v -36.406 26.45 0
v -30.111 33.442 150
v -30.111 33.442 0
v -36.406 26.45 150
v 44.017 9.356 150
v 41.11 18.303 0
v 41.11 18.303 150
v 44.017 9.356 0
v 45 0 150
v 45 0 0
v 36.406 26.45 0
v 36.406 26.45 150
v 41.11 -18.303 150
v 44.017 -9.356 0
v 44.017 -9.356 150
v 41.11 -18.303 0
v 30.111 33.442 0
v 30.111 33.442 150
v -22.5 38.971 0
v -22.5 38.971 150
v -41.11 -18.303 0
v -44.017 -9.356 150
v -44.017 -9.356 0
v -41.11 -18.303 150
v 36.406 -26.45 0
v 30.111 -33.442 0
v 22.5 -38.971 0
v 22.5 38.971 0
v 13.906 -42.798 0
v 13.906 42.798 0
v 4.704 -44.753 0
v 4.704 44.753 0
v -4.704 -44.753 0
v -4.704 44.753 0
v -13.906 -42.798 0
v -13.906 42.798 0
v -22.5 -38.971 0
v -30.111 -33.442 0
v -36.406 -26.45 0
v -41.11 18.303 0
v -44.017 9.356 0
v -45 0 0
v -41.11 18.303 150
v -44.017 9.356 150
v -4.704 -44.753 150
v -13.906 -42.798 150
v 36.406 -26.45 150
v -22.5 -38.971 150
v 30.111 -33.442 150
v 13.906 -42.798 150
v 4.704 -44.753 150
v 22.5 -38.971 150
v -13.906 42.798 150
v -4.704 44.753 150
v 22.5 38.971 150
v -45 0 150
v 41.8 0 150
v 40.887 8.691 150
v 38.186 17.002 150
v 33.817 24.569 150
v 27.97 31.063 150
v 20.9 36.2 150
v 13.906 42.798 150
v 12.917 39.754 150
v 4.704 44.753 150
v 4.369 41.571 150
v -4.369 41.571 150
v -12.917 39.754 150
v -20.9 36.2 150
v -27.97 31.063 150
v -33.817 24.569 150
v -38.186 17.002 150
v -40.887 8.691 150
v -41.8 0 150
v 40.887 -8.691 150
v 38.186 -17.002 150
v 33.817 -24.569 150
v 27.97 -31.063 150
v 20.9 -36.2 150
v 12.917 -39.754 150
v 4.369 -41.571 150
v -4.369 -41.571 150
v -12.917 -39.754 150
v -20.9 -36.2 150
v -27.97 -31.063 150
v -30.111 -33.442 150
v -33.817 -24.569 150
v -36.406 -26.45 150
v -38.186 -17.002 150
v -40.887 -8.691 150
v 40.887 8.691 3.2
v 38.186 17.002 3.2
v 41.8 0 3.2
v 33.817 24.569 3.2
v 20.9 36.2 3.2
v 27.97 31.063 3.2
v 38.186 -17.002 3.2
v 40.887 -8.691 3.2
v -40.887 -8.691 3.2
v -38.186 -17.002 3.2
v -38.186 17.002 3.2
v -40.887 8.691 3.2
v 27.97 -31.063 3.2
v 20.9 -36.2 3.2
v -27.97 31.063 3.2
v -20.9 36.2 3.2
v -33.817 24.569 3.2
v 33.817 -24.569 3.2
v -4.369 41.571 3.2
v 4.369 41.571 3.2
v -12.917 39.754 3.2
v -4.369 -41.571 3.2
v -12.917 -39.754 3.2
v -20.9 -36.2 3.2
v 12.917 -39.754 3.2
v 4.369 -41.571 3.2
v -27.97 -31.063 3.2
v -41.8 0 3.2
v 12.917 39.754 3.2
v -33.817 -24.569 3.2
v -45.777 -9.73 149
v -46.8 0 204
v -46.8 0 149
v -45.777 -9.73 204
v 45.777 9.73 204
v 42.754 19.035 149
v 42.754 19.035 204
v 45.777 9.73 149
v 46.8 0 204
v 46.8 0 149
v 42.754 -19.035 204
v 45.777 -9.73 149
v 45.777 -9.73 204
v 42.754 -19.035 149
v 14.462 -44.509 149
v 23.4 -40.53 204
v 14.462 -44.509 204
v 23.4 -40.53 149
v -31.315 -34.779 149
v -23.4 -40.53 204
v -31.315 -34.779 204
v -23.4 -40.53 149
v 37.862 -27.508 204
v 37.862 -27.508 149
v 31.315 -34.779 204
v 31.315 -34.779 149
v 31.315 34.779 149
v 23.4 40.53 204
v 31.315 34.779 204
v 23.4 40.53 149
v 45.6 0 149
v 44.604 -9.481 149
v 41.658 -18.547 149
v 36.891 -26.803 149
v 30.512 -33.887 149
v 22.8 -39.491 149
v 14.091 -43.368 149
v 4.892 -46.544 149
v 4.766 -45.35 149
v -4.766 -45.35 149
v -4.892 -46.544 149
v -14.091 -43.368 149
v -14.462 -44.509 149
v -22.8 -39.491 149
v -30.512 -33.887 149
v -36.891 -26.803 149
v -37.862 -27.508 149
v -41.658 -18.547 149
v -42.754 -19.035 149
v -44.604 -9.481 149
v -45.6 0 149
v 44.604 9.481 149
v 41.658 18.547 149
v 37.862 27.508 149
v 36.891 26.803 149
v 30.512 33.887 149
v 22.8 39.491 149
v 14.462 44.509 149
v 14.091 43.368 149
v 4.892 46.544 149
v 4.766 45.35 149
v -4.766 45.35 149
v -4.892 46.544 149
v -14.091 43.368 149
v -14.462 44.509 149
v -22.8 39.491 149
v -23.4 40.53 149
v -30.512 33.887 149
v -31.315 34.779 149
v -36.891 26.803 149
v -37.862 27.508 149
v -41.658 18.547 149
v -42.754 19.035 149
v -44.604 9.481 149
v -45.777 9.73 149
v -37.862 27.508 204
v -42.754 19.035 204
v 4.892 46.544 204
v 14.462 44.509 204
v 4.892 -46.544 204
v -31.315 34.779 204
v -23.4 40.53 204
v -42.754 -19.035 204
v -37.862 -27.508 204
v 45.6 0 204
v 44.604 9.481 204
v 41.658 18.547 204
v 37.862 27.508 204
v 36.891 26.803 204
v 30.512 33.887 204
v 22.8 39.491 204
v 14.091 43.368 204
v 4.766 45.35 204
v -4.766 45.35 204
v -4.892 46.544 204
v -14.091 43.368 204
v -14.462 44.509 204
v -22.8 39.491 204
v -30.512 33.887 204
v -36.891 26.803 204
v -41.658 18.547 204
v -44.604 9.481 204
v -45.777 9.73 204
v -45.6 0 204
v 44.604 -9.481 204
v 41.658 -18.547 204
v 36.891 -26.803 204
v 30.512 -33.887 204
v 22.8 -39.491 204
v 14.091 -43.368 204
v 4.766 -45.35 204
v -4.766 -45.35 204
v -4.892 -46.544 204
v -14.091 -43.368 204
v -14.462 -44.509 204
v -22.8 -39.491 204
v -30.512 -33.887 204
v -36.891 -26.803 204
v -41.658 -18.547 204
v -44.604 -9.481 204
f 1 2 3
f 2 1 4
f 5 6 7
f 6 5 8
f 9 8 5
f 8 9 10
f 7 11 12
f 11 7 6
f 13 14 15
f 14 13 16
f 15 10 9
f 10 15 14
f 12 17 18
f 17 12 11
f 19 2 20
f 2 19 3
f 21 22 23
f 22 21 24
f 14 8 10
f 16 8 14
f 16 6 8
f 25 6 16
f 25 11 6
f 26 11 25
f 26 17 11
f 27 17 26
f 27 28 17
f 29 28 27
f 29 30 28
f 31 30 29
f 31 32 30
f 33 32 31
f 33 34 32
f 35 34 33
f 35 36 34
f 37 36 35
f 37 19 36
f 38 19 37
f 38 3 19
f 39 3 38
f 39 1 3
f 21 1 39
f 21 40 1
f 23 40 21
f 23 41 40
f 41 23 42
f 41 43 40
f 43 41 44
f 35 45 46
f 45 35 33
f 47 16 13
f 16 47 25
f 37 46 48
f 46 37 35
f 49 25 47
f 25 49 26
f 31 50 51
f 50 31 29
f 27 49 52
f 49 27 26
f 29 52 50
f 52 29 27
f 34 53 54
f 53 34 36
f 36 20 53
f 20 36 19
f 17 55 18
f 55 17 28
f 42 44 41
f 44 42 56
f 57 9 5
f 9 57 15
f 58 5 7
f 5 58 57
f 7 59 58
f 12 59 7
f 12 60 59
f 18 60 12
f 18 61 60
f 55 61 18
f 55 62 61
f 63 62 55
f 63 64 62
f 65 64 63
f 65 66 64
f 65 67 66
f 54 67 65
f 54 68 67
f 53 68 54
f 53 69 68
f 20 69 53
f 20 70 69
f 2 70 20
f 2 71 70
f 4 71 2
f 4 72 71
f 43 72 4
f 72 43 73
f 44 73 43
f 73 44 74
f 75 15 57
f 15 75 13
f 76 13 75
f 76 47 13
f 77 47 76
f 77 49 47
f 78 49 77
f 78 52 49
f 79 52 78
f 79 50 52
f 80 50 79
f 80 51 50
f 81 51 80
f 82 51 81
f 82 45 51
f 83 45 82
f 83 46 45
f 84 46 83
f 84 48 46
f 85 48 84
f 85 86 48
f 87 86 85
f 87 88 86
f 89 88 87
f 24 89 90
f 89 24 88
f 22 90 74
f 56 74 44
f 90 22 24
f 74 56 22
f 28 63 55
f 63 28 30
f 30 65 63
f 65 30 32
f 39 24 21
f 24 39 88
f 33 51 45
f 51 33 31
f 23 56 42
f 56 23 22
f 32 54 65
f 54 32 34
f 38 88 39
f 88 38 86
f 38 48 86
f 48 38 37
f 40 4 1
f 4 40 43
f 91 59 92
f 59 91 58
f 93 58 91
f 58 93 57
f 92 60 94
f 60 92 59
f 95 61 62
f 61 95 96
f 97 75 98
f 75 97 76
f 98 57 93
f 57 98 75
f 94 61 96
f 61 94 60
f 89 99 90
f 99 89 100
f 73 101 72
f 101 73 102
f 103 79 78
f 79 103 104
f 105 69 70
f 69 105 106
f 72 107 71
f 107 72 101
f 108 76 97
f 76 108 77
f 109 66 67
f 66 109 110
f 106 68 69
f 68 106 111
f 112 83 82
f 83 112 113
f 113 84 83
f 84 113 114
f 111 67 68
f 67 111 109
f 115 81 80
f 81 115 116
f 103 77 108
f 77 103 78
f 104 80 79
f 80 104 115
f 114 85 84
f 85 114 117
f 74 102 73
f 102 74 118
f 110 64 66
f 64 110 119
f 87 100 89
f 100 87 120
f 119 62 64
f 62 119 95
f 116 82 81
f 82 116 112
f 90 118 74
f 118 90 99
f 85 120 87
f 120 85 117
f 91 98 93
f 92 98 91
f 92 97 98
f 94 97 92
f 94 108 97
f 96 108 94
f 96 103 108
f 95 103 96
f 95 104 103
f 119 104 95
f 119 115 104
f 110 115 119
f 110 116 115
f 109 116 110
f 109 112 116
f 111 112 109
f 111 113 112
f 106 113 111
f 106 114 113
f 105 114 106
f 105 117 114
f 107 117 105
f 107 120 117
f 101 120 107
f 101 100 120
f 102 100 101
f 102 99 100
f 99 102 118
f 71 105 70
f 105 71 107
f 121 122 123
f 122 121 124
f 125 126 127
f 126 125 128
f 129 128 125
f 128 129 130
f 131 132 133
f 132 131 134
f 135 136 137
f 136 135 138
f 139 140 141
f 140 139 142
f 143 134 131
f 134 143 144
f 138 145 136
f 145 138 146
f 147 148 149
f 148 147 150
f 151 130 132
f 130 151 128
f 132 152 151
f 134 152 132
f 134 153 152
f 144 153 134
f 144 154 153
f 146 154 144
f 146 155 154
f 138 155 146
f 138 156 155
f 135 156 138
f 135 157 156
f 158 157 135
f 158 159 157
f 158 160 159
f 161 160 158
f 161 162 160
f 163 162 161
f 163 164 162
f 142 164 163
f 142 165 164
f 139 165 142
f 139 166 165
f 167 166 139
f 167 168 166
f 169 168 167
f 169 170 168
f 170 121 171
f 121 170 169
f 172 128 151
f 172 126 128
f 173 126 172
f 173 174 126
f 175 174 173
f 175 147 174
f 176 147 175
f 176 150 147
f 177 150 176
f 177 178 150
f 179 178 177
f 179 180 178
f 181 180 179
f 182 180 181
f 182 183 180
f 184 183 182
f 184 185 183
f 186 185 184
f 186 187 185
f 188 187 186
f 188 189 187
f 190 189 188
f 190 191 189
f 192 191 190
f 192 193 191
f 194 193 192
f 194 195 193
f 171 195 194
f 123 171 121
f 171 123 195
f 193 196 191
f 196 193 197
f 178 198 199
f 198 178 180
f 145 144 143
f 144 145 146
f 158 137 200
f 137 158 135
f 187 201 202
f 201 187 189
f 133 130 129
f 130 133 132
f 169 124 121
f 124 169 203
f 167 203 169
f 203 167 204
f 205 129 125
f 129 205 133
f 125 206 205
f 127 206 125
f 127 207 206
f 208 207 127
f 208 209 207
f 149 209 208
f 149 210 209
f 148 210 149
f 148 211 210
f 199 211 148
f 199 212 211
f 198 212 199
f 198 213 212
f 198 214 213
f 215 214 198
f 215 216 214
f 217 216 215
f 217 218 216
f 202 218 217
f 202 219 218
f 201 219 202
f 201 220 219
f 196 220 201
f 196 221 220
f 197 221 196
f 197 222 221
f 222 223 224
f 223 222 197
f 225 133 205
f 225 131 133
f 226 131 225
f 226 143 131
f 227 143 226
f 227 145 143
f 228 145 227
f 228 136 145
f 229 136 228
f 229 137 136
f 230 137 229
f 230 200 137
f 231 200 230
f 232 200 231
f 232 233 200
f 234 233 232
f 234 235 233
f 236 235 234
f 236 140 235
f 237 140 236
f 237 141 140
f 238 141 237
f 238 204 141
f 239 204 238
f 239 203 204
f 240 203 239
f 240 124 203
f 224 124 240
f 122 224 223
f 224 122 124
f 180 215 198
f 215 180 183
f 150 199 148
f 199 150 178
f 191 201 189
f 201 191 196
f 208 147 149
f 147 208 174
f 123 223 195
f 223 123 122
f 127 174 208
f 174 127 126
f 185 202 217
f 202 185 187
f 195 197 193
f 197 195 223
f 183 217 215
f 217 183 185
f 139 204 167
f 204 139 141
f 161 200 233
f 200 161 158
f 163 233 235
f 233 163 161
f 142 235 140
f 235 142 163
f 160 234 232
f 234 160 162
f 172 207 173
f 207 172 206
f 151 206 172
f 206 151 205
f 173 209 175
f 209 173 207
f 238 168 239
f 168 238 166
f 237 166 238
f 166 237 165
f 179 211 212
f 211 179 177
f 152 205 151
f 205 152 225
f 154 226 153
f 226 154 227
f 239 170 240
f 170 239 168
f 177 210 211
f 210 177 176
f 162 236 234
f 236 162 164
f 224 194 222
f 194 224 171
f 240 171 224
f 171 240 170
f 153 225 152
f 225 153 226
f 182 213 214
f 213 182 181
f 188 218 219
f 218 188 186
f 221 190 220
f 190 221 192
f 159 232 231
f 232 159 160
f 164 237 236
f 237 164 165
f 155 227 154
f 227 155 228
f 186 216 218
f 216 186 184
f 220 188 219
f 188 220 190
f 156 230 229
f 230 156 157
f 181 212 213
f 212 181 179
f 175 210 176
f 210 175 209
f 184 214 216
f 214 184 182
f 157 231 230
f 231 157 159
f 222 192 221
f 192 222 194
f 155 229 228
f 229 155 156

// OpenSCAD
// Parameters
pipe_standard = 1; //[1:1:1]
nominal_size = 90; //[50:180:1]
length_mm = 150; //[75:300:1]
orientation = 0; //[0:0:1]
center = 0; //[0:0:1]
pipe_od = 90; //[50:180:1]
pipe_wall = 3.2; //[1.6:6.4:0.1]
socket_length = 55; //[30:110:1]
socket_wall_extra = 1.8; //[0.8:4:0.1]
socket_clearance = 0.6; //[0.2:1.5:0.1]
connection_overlap = 1; //[0.5:2:0.1]

// Module for HT Pipe
module ht_pipe() {
  color([0.85, 0.85, 0.8]) { // PVC color
    union() {
      // Pipe body
      difference() {
        cylinder(h=length_mm, r=pipe_od/2, center=false);
        translate([0, 0, pipe_wall])
          cylinder(h=length_mm, r=pipe_od/2 - pipe_wall, center=false);
      }
      // End fitting socket
      difference() {
        translate([0, 0, length_mm - connection_overlap])
          cylinder(h=socket_length, r=pipe_od/2 + socket_wall_extra, center=false);
        translate([0, 0, length_mm - connection_overlap])
          cylinder(h=socket_length, r=pipe_od/2 + socket_clearance, center=false);
      }
    }
  }
}

// Assembly
module assembly() {
  ht_pipe();
}

assembly();
